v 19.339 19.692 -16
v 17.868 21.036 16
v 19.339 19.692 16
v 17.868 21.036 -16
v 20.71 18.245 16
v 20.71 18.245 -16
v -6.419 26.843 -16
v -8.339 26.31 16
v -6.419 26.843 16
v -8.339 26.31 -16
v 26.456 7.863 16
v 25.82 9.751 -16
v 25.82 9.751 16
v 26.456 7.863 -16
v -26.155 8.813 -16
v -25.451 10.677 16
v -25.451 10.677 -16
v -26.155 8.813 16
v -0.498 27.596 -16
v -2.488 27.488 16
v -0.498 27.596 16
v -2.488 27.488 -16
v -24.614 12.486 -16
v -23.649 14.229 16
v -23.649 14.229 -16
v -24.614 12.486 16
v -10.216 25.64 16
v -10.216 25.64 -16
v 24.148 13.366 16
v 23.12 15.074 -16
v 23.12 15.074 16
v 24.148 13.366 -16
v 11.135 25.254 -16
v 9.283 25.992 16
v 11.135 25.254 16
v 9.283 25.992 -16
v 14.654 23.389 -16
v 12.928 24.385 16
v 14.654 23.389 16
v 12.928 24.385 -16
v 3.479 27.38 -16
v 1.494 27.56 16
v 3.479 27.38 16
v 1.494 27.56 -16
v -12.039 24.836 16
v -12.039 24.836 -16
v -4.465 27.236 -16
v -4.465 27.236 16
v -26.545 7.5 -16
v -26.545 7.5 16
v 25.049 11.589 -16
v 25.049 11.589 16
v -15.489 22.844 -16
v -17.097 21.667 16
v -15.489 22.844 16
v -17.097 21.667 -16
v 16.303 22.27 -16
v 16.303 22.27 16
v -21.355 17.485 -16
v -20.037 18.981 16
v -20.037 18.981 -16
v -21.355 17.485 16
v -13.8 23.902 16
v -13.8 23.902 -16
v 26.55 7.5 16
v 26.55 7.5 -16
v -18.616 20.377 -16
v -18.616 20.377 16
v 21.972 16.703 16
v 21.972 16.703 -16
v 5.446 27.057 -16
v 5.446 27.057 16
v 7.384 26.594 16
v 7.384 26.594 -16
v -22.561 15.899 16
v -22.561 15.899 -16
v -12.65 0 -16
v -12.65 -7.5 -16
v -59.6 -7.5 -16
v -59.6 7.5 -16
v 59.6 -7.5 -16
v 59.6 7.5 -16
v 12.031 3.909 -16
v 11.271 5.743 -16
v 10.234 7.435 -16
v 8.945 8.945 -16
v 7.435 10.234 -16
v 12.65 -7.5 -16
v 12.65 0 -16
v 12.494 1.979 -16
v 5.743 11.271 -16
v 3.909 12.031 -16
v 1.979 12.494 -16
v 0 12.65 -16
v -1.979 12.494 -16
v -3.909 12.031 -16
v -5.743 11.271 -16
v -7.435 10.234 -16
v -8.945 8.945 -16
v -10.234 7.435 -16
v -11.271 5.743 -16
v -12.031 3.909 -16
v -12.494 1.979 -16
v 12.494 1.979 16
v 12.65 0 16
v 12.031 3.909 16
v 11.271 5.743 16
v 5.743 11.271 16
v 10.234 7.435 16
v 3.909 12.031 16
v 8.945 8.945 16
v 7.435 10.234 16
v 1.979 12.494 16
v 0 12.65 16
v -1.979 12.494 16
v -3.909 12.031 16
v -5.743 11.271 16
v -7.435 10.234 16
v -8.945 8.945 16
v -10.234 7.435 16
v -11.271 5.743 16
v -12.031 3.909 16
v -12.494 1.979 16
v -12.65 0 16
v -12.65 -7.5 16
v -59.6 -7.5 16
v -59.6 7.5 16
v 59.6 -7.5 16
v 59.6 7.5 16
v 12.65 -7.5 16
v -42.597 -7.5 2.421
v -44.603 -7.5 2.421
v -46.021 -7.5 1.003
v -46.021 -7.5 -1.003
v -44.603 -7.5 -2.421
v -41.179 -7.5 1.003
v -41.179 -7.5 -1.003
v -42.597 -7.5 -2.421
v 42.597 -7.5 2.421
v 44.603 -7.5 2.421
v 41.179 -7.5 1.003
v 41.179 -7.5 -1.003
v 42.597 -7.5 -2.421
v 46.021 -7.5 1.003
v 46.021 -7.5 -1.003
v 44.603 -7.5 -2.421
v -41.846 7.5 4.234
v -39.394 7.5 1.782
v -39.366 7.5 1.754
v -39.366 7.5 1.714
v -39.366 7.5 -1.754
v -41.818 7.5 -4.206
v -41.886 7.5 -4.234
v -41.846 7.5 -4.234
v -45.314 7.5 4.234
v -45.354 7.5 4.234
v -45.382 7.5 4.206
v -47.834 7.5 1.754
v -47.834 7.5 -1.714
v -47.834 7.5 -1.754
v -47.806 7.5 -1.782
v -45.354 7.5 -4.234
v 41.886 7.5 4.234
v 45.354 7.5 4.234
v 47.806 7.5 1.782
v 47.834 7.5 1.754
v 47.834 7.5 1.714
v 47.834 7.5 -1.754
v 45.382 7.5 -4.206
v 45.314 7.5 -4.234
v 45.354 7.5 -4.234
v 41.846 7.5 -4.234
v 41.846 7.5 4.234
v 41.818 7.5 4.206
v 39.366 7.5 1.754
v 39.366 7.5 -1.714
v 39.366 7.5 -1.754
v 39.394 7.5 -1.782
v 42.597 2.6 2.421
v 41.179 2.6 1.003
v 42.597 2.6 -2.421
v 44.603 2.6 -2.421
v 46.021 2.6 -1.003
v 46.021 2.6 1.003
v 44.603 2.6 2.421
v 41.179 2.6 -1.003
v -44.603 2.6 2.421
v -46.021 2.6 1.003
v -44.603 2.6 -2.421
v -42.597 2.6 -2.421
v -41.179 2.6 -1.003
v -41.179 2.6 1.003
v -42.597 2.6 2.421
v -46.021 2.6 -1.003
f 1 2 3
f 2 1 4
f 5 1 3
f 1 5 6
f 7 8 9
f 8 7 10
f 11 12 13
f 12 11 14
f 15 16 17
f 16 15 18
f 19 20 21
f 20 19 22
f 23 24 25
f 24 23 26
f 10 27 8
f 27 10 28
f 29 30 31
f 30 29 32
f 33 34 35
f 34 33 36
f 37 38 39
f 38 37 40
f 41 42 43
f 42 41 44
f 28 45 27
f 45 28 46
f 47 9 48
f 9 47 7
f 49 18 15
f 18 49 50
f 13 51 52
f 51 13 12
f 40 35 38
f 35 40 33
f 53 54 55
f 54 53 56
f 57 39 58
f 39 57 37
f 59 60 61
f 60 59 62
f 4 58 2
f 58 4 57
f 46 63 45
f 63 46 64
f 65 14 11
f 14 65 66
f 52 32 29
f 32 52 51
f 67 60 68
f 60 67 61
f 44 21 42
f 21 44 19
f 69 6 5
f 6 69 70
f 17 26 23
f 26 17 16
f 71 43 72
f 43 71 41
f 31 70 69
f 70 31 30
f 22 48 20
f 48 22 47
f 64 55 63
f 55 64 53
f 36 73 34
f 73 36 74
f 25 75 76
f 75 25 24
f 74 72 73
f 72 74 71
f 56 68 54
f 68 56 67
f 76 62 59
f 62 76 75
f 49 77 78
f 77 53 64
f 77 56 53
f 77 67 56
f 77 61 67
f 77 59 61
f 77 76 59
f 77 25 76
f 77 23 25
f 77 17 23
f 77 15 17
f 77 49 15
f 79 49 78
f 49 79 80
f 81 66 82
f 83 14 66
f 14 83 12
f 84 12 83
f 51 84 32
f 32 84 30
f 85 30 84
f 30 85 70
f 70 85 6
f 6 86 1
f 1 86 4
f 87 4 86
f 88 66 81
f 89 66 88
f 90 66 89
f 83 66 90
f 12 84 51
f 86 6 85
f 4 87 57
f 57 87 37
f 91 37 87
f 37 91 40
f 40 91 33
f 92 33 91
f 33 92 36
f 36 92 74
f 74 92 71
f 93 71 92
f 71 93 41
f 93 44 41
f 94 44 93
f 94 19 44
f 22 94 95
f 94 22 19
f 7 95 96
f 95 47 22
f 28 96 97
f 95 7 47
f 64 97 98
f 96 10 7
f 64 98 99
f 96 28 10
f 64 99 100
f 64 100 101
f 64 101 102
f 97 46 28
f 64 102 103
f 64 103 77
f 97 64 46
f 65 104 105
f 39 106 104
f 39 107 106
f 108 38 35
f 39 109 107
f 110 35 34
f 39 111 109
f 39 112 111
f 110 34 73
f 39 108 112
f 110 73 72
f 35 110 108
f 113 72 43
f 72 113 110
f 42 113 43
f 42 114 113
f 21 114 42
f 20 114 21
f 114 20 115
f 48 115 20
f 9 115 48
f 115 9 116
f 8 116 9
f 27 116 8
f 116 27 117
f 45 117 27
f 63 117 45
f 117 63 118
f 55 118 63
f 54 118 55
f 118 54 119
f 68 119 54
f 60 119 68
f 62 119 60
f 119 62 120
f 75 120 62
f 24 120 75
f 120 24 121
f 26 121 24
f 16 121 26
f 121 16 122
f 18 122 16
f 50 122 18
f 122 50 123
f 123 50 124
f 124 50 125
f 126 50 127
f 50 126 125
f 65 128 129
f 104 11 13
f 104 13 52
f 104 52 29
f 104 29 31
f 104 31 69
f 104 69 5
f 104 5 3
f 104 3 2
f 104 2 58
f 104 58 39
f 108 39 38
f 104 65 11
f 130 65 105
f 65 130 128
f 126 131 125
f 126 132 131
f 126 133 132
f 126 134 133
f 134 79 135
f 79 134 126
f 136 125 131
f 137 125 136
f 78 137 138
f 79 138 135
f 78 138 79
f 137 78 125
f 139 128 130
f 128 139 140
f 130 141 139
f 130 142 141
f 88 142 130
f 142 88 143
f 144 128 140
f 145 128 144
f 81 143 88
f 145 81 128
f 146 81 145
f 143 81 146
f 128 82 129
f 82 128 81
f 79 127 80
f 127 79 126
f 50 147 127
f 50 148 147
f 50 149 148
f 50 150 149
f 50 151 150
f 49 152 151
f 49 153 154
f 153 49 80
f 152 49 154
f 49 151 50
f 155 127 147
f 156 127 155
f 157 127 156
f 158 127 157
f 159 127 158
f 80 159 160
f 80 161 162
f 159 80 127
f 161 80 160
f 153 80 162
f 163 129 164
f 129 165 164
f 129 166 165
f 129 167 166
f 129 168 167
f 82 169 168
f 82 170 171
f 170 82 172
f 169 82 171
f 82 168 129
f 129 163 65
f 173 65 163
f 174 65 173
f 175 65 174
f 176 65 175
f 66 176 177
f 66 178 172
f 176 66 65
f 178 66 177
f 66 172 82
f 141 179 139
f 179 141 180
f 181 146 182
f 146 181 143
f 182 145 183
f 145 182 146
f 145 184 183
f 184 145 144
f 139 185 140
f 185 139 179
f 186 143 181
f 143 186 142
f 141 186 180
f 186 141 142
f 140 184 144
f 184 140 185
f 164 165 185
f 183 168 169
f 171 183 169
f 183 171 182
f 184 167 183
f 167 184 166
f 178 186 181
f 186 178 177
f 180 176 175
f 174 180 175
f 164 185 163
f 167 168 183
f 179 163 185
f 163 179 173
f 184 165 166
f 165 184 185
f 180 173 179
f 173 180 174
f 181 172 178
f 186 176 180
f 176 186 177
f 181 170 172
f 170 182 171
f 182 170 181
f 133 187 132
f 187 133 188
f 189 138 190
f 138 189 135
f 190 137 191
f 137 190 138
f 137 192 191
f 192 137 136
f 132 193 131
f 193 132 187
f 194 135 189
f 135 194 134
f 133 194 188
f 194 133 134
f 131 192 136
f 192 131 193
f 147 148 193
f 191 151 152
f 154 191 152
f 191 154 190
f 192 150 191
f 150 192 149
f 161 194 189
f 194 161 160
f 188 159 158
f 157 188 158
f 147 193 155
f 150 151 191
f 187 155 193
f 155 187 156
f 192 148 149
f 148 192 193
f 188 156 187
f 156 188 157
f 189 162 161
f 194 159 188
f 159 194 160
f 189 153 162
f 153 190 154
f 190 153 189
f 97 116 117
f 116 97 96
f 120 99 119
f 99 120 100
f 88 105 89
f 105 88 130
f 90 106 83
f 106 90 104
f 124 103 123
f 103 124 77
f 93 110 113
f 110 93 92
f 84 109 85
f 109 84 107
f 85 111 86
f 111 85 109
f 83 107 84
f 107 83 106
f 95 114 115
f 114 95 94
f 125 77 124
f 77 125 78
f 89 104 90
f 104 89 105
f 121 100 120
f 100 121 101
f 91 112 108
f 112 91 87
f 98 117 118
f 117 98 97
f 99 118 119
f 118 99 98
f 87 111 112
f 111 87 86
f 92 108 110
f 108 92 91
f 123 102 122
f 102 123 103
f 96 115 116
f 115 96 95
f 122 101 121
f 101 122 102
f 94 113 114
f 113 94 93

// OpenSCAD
$fa = .01;
//$fs = $preview ? 1 :.2;

d = 25.2;
h = 32;
t = 15;

screw_d=4.75;
cs_d=8.45;
cs_h = 5;
ep = .1;

sin8 = 1/cos(360/16);

module screw(){
    rotate([-90,360/16,0]) {
        cylinder(d=screw_d*sin8+ep, h=t+ep, center=true, $fn=8);
        translate([0,0,t/2-cs_h/2+ep]) cylinder(d1=screw_d*sin8+ep, d2=cs_d*sin8+ep, h=cs_h, center=true, $fn=8);
    }
};

difference(){
    union(){
        cube([d+2*t+2*h,t,h], center=true);
        difference(){
            cylinder(d=d+2*t, h=h, center=true);
            translate([0,-(d+2*t)/2-t/2,0]) cube(d+2*t, center=true);
        }
    }
    hull(){
        translate([0, 0,0]) cylinder(d=d+ep, h=h+ep, center=true);
        translate([0,-d,0]) cylinder(d=d+ep, h=h+ep, center=true);
    }
    translate([ (d/2+t+h/2),0,0]) screw();
    translate([-(d/2+t+h/2),0,0]) screw();
}
